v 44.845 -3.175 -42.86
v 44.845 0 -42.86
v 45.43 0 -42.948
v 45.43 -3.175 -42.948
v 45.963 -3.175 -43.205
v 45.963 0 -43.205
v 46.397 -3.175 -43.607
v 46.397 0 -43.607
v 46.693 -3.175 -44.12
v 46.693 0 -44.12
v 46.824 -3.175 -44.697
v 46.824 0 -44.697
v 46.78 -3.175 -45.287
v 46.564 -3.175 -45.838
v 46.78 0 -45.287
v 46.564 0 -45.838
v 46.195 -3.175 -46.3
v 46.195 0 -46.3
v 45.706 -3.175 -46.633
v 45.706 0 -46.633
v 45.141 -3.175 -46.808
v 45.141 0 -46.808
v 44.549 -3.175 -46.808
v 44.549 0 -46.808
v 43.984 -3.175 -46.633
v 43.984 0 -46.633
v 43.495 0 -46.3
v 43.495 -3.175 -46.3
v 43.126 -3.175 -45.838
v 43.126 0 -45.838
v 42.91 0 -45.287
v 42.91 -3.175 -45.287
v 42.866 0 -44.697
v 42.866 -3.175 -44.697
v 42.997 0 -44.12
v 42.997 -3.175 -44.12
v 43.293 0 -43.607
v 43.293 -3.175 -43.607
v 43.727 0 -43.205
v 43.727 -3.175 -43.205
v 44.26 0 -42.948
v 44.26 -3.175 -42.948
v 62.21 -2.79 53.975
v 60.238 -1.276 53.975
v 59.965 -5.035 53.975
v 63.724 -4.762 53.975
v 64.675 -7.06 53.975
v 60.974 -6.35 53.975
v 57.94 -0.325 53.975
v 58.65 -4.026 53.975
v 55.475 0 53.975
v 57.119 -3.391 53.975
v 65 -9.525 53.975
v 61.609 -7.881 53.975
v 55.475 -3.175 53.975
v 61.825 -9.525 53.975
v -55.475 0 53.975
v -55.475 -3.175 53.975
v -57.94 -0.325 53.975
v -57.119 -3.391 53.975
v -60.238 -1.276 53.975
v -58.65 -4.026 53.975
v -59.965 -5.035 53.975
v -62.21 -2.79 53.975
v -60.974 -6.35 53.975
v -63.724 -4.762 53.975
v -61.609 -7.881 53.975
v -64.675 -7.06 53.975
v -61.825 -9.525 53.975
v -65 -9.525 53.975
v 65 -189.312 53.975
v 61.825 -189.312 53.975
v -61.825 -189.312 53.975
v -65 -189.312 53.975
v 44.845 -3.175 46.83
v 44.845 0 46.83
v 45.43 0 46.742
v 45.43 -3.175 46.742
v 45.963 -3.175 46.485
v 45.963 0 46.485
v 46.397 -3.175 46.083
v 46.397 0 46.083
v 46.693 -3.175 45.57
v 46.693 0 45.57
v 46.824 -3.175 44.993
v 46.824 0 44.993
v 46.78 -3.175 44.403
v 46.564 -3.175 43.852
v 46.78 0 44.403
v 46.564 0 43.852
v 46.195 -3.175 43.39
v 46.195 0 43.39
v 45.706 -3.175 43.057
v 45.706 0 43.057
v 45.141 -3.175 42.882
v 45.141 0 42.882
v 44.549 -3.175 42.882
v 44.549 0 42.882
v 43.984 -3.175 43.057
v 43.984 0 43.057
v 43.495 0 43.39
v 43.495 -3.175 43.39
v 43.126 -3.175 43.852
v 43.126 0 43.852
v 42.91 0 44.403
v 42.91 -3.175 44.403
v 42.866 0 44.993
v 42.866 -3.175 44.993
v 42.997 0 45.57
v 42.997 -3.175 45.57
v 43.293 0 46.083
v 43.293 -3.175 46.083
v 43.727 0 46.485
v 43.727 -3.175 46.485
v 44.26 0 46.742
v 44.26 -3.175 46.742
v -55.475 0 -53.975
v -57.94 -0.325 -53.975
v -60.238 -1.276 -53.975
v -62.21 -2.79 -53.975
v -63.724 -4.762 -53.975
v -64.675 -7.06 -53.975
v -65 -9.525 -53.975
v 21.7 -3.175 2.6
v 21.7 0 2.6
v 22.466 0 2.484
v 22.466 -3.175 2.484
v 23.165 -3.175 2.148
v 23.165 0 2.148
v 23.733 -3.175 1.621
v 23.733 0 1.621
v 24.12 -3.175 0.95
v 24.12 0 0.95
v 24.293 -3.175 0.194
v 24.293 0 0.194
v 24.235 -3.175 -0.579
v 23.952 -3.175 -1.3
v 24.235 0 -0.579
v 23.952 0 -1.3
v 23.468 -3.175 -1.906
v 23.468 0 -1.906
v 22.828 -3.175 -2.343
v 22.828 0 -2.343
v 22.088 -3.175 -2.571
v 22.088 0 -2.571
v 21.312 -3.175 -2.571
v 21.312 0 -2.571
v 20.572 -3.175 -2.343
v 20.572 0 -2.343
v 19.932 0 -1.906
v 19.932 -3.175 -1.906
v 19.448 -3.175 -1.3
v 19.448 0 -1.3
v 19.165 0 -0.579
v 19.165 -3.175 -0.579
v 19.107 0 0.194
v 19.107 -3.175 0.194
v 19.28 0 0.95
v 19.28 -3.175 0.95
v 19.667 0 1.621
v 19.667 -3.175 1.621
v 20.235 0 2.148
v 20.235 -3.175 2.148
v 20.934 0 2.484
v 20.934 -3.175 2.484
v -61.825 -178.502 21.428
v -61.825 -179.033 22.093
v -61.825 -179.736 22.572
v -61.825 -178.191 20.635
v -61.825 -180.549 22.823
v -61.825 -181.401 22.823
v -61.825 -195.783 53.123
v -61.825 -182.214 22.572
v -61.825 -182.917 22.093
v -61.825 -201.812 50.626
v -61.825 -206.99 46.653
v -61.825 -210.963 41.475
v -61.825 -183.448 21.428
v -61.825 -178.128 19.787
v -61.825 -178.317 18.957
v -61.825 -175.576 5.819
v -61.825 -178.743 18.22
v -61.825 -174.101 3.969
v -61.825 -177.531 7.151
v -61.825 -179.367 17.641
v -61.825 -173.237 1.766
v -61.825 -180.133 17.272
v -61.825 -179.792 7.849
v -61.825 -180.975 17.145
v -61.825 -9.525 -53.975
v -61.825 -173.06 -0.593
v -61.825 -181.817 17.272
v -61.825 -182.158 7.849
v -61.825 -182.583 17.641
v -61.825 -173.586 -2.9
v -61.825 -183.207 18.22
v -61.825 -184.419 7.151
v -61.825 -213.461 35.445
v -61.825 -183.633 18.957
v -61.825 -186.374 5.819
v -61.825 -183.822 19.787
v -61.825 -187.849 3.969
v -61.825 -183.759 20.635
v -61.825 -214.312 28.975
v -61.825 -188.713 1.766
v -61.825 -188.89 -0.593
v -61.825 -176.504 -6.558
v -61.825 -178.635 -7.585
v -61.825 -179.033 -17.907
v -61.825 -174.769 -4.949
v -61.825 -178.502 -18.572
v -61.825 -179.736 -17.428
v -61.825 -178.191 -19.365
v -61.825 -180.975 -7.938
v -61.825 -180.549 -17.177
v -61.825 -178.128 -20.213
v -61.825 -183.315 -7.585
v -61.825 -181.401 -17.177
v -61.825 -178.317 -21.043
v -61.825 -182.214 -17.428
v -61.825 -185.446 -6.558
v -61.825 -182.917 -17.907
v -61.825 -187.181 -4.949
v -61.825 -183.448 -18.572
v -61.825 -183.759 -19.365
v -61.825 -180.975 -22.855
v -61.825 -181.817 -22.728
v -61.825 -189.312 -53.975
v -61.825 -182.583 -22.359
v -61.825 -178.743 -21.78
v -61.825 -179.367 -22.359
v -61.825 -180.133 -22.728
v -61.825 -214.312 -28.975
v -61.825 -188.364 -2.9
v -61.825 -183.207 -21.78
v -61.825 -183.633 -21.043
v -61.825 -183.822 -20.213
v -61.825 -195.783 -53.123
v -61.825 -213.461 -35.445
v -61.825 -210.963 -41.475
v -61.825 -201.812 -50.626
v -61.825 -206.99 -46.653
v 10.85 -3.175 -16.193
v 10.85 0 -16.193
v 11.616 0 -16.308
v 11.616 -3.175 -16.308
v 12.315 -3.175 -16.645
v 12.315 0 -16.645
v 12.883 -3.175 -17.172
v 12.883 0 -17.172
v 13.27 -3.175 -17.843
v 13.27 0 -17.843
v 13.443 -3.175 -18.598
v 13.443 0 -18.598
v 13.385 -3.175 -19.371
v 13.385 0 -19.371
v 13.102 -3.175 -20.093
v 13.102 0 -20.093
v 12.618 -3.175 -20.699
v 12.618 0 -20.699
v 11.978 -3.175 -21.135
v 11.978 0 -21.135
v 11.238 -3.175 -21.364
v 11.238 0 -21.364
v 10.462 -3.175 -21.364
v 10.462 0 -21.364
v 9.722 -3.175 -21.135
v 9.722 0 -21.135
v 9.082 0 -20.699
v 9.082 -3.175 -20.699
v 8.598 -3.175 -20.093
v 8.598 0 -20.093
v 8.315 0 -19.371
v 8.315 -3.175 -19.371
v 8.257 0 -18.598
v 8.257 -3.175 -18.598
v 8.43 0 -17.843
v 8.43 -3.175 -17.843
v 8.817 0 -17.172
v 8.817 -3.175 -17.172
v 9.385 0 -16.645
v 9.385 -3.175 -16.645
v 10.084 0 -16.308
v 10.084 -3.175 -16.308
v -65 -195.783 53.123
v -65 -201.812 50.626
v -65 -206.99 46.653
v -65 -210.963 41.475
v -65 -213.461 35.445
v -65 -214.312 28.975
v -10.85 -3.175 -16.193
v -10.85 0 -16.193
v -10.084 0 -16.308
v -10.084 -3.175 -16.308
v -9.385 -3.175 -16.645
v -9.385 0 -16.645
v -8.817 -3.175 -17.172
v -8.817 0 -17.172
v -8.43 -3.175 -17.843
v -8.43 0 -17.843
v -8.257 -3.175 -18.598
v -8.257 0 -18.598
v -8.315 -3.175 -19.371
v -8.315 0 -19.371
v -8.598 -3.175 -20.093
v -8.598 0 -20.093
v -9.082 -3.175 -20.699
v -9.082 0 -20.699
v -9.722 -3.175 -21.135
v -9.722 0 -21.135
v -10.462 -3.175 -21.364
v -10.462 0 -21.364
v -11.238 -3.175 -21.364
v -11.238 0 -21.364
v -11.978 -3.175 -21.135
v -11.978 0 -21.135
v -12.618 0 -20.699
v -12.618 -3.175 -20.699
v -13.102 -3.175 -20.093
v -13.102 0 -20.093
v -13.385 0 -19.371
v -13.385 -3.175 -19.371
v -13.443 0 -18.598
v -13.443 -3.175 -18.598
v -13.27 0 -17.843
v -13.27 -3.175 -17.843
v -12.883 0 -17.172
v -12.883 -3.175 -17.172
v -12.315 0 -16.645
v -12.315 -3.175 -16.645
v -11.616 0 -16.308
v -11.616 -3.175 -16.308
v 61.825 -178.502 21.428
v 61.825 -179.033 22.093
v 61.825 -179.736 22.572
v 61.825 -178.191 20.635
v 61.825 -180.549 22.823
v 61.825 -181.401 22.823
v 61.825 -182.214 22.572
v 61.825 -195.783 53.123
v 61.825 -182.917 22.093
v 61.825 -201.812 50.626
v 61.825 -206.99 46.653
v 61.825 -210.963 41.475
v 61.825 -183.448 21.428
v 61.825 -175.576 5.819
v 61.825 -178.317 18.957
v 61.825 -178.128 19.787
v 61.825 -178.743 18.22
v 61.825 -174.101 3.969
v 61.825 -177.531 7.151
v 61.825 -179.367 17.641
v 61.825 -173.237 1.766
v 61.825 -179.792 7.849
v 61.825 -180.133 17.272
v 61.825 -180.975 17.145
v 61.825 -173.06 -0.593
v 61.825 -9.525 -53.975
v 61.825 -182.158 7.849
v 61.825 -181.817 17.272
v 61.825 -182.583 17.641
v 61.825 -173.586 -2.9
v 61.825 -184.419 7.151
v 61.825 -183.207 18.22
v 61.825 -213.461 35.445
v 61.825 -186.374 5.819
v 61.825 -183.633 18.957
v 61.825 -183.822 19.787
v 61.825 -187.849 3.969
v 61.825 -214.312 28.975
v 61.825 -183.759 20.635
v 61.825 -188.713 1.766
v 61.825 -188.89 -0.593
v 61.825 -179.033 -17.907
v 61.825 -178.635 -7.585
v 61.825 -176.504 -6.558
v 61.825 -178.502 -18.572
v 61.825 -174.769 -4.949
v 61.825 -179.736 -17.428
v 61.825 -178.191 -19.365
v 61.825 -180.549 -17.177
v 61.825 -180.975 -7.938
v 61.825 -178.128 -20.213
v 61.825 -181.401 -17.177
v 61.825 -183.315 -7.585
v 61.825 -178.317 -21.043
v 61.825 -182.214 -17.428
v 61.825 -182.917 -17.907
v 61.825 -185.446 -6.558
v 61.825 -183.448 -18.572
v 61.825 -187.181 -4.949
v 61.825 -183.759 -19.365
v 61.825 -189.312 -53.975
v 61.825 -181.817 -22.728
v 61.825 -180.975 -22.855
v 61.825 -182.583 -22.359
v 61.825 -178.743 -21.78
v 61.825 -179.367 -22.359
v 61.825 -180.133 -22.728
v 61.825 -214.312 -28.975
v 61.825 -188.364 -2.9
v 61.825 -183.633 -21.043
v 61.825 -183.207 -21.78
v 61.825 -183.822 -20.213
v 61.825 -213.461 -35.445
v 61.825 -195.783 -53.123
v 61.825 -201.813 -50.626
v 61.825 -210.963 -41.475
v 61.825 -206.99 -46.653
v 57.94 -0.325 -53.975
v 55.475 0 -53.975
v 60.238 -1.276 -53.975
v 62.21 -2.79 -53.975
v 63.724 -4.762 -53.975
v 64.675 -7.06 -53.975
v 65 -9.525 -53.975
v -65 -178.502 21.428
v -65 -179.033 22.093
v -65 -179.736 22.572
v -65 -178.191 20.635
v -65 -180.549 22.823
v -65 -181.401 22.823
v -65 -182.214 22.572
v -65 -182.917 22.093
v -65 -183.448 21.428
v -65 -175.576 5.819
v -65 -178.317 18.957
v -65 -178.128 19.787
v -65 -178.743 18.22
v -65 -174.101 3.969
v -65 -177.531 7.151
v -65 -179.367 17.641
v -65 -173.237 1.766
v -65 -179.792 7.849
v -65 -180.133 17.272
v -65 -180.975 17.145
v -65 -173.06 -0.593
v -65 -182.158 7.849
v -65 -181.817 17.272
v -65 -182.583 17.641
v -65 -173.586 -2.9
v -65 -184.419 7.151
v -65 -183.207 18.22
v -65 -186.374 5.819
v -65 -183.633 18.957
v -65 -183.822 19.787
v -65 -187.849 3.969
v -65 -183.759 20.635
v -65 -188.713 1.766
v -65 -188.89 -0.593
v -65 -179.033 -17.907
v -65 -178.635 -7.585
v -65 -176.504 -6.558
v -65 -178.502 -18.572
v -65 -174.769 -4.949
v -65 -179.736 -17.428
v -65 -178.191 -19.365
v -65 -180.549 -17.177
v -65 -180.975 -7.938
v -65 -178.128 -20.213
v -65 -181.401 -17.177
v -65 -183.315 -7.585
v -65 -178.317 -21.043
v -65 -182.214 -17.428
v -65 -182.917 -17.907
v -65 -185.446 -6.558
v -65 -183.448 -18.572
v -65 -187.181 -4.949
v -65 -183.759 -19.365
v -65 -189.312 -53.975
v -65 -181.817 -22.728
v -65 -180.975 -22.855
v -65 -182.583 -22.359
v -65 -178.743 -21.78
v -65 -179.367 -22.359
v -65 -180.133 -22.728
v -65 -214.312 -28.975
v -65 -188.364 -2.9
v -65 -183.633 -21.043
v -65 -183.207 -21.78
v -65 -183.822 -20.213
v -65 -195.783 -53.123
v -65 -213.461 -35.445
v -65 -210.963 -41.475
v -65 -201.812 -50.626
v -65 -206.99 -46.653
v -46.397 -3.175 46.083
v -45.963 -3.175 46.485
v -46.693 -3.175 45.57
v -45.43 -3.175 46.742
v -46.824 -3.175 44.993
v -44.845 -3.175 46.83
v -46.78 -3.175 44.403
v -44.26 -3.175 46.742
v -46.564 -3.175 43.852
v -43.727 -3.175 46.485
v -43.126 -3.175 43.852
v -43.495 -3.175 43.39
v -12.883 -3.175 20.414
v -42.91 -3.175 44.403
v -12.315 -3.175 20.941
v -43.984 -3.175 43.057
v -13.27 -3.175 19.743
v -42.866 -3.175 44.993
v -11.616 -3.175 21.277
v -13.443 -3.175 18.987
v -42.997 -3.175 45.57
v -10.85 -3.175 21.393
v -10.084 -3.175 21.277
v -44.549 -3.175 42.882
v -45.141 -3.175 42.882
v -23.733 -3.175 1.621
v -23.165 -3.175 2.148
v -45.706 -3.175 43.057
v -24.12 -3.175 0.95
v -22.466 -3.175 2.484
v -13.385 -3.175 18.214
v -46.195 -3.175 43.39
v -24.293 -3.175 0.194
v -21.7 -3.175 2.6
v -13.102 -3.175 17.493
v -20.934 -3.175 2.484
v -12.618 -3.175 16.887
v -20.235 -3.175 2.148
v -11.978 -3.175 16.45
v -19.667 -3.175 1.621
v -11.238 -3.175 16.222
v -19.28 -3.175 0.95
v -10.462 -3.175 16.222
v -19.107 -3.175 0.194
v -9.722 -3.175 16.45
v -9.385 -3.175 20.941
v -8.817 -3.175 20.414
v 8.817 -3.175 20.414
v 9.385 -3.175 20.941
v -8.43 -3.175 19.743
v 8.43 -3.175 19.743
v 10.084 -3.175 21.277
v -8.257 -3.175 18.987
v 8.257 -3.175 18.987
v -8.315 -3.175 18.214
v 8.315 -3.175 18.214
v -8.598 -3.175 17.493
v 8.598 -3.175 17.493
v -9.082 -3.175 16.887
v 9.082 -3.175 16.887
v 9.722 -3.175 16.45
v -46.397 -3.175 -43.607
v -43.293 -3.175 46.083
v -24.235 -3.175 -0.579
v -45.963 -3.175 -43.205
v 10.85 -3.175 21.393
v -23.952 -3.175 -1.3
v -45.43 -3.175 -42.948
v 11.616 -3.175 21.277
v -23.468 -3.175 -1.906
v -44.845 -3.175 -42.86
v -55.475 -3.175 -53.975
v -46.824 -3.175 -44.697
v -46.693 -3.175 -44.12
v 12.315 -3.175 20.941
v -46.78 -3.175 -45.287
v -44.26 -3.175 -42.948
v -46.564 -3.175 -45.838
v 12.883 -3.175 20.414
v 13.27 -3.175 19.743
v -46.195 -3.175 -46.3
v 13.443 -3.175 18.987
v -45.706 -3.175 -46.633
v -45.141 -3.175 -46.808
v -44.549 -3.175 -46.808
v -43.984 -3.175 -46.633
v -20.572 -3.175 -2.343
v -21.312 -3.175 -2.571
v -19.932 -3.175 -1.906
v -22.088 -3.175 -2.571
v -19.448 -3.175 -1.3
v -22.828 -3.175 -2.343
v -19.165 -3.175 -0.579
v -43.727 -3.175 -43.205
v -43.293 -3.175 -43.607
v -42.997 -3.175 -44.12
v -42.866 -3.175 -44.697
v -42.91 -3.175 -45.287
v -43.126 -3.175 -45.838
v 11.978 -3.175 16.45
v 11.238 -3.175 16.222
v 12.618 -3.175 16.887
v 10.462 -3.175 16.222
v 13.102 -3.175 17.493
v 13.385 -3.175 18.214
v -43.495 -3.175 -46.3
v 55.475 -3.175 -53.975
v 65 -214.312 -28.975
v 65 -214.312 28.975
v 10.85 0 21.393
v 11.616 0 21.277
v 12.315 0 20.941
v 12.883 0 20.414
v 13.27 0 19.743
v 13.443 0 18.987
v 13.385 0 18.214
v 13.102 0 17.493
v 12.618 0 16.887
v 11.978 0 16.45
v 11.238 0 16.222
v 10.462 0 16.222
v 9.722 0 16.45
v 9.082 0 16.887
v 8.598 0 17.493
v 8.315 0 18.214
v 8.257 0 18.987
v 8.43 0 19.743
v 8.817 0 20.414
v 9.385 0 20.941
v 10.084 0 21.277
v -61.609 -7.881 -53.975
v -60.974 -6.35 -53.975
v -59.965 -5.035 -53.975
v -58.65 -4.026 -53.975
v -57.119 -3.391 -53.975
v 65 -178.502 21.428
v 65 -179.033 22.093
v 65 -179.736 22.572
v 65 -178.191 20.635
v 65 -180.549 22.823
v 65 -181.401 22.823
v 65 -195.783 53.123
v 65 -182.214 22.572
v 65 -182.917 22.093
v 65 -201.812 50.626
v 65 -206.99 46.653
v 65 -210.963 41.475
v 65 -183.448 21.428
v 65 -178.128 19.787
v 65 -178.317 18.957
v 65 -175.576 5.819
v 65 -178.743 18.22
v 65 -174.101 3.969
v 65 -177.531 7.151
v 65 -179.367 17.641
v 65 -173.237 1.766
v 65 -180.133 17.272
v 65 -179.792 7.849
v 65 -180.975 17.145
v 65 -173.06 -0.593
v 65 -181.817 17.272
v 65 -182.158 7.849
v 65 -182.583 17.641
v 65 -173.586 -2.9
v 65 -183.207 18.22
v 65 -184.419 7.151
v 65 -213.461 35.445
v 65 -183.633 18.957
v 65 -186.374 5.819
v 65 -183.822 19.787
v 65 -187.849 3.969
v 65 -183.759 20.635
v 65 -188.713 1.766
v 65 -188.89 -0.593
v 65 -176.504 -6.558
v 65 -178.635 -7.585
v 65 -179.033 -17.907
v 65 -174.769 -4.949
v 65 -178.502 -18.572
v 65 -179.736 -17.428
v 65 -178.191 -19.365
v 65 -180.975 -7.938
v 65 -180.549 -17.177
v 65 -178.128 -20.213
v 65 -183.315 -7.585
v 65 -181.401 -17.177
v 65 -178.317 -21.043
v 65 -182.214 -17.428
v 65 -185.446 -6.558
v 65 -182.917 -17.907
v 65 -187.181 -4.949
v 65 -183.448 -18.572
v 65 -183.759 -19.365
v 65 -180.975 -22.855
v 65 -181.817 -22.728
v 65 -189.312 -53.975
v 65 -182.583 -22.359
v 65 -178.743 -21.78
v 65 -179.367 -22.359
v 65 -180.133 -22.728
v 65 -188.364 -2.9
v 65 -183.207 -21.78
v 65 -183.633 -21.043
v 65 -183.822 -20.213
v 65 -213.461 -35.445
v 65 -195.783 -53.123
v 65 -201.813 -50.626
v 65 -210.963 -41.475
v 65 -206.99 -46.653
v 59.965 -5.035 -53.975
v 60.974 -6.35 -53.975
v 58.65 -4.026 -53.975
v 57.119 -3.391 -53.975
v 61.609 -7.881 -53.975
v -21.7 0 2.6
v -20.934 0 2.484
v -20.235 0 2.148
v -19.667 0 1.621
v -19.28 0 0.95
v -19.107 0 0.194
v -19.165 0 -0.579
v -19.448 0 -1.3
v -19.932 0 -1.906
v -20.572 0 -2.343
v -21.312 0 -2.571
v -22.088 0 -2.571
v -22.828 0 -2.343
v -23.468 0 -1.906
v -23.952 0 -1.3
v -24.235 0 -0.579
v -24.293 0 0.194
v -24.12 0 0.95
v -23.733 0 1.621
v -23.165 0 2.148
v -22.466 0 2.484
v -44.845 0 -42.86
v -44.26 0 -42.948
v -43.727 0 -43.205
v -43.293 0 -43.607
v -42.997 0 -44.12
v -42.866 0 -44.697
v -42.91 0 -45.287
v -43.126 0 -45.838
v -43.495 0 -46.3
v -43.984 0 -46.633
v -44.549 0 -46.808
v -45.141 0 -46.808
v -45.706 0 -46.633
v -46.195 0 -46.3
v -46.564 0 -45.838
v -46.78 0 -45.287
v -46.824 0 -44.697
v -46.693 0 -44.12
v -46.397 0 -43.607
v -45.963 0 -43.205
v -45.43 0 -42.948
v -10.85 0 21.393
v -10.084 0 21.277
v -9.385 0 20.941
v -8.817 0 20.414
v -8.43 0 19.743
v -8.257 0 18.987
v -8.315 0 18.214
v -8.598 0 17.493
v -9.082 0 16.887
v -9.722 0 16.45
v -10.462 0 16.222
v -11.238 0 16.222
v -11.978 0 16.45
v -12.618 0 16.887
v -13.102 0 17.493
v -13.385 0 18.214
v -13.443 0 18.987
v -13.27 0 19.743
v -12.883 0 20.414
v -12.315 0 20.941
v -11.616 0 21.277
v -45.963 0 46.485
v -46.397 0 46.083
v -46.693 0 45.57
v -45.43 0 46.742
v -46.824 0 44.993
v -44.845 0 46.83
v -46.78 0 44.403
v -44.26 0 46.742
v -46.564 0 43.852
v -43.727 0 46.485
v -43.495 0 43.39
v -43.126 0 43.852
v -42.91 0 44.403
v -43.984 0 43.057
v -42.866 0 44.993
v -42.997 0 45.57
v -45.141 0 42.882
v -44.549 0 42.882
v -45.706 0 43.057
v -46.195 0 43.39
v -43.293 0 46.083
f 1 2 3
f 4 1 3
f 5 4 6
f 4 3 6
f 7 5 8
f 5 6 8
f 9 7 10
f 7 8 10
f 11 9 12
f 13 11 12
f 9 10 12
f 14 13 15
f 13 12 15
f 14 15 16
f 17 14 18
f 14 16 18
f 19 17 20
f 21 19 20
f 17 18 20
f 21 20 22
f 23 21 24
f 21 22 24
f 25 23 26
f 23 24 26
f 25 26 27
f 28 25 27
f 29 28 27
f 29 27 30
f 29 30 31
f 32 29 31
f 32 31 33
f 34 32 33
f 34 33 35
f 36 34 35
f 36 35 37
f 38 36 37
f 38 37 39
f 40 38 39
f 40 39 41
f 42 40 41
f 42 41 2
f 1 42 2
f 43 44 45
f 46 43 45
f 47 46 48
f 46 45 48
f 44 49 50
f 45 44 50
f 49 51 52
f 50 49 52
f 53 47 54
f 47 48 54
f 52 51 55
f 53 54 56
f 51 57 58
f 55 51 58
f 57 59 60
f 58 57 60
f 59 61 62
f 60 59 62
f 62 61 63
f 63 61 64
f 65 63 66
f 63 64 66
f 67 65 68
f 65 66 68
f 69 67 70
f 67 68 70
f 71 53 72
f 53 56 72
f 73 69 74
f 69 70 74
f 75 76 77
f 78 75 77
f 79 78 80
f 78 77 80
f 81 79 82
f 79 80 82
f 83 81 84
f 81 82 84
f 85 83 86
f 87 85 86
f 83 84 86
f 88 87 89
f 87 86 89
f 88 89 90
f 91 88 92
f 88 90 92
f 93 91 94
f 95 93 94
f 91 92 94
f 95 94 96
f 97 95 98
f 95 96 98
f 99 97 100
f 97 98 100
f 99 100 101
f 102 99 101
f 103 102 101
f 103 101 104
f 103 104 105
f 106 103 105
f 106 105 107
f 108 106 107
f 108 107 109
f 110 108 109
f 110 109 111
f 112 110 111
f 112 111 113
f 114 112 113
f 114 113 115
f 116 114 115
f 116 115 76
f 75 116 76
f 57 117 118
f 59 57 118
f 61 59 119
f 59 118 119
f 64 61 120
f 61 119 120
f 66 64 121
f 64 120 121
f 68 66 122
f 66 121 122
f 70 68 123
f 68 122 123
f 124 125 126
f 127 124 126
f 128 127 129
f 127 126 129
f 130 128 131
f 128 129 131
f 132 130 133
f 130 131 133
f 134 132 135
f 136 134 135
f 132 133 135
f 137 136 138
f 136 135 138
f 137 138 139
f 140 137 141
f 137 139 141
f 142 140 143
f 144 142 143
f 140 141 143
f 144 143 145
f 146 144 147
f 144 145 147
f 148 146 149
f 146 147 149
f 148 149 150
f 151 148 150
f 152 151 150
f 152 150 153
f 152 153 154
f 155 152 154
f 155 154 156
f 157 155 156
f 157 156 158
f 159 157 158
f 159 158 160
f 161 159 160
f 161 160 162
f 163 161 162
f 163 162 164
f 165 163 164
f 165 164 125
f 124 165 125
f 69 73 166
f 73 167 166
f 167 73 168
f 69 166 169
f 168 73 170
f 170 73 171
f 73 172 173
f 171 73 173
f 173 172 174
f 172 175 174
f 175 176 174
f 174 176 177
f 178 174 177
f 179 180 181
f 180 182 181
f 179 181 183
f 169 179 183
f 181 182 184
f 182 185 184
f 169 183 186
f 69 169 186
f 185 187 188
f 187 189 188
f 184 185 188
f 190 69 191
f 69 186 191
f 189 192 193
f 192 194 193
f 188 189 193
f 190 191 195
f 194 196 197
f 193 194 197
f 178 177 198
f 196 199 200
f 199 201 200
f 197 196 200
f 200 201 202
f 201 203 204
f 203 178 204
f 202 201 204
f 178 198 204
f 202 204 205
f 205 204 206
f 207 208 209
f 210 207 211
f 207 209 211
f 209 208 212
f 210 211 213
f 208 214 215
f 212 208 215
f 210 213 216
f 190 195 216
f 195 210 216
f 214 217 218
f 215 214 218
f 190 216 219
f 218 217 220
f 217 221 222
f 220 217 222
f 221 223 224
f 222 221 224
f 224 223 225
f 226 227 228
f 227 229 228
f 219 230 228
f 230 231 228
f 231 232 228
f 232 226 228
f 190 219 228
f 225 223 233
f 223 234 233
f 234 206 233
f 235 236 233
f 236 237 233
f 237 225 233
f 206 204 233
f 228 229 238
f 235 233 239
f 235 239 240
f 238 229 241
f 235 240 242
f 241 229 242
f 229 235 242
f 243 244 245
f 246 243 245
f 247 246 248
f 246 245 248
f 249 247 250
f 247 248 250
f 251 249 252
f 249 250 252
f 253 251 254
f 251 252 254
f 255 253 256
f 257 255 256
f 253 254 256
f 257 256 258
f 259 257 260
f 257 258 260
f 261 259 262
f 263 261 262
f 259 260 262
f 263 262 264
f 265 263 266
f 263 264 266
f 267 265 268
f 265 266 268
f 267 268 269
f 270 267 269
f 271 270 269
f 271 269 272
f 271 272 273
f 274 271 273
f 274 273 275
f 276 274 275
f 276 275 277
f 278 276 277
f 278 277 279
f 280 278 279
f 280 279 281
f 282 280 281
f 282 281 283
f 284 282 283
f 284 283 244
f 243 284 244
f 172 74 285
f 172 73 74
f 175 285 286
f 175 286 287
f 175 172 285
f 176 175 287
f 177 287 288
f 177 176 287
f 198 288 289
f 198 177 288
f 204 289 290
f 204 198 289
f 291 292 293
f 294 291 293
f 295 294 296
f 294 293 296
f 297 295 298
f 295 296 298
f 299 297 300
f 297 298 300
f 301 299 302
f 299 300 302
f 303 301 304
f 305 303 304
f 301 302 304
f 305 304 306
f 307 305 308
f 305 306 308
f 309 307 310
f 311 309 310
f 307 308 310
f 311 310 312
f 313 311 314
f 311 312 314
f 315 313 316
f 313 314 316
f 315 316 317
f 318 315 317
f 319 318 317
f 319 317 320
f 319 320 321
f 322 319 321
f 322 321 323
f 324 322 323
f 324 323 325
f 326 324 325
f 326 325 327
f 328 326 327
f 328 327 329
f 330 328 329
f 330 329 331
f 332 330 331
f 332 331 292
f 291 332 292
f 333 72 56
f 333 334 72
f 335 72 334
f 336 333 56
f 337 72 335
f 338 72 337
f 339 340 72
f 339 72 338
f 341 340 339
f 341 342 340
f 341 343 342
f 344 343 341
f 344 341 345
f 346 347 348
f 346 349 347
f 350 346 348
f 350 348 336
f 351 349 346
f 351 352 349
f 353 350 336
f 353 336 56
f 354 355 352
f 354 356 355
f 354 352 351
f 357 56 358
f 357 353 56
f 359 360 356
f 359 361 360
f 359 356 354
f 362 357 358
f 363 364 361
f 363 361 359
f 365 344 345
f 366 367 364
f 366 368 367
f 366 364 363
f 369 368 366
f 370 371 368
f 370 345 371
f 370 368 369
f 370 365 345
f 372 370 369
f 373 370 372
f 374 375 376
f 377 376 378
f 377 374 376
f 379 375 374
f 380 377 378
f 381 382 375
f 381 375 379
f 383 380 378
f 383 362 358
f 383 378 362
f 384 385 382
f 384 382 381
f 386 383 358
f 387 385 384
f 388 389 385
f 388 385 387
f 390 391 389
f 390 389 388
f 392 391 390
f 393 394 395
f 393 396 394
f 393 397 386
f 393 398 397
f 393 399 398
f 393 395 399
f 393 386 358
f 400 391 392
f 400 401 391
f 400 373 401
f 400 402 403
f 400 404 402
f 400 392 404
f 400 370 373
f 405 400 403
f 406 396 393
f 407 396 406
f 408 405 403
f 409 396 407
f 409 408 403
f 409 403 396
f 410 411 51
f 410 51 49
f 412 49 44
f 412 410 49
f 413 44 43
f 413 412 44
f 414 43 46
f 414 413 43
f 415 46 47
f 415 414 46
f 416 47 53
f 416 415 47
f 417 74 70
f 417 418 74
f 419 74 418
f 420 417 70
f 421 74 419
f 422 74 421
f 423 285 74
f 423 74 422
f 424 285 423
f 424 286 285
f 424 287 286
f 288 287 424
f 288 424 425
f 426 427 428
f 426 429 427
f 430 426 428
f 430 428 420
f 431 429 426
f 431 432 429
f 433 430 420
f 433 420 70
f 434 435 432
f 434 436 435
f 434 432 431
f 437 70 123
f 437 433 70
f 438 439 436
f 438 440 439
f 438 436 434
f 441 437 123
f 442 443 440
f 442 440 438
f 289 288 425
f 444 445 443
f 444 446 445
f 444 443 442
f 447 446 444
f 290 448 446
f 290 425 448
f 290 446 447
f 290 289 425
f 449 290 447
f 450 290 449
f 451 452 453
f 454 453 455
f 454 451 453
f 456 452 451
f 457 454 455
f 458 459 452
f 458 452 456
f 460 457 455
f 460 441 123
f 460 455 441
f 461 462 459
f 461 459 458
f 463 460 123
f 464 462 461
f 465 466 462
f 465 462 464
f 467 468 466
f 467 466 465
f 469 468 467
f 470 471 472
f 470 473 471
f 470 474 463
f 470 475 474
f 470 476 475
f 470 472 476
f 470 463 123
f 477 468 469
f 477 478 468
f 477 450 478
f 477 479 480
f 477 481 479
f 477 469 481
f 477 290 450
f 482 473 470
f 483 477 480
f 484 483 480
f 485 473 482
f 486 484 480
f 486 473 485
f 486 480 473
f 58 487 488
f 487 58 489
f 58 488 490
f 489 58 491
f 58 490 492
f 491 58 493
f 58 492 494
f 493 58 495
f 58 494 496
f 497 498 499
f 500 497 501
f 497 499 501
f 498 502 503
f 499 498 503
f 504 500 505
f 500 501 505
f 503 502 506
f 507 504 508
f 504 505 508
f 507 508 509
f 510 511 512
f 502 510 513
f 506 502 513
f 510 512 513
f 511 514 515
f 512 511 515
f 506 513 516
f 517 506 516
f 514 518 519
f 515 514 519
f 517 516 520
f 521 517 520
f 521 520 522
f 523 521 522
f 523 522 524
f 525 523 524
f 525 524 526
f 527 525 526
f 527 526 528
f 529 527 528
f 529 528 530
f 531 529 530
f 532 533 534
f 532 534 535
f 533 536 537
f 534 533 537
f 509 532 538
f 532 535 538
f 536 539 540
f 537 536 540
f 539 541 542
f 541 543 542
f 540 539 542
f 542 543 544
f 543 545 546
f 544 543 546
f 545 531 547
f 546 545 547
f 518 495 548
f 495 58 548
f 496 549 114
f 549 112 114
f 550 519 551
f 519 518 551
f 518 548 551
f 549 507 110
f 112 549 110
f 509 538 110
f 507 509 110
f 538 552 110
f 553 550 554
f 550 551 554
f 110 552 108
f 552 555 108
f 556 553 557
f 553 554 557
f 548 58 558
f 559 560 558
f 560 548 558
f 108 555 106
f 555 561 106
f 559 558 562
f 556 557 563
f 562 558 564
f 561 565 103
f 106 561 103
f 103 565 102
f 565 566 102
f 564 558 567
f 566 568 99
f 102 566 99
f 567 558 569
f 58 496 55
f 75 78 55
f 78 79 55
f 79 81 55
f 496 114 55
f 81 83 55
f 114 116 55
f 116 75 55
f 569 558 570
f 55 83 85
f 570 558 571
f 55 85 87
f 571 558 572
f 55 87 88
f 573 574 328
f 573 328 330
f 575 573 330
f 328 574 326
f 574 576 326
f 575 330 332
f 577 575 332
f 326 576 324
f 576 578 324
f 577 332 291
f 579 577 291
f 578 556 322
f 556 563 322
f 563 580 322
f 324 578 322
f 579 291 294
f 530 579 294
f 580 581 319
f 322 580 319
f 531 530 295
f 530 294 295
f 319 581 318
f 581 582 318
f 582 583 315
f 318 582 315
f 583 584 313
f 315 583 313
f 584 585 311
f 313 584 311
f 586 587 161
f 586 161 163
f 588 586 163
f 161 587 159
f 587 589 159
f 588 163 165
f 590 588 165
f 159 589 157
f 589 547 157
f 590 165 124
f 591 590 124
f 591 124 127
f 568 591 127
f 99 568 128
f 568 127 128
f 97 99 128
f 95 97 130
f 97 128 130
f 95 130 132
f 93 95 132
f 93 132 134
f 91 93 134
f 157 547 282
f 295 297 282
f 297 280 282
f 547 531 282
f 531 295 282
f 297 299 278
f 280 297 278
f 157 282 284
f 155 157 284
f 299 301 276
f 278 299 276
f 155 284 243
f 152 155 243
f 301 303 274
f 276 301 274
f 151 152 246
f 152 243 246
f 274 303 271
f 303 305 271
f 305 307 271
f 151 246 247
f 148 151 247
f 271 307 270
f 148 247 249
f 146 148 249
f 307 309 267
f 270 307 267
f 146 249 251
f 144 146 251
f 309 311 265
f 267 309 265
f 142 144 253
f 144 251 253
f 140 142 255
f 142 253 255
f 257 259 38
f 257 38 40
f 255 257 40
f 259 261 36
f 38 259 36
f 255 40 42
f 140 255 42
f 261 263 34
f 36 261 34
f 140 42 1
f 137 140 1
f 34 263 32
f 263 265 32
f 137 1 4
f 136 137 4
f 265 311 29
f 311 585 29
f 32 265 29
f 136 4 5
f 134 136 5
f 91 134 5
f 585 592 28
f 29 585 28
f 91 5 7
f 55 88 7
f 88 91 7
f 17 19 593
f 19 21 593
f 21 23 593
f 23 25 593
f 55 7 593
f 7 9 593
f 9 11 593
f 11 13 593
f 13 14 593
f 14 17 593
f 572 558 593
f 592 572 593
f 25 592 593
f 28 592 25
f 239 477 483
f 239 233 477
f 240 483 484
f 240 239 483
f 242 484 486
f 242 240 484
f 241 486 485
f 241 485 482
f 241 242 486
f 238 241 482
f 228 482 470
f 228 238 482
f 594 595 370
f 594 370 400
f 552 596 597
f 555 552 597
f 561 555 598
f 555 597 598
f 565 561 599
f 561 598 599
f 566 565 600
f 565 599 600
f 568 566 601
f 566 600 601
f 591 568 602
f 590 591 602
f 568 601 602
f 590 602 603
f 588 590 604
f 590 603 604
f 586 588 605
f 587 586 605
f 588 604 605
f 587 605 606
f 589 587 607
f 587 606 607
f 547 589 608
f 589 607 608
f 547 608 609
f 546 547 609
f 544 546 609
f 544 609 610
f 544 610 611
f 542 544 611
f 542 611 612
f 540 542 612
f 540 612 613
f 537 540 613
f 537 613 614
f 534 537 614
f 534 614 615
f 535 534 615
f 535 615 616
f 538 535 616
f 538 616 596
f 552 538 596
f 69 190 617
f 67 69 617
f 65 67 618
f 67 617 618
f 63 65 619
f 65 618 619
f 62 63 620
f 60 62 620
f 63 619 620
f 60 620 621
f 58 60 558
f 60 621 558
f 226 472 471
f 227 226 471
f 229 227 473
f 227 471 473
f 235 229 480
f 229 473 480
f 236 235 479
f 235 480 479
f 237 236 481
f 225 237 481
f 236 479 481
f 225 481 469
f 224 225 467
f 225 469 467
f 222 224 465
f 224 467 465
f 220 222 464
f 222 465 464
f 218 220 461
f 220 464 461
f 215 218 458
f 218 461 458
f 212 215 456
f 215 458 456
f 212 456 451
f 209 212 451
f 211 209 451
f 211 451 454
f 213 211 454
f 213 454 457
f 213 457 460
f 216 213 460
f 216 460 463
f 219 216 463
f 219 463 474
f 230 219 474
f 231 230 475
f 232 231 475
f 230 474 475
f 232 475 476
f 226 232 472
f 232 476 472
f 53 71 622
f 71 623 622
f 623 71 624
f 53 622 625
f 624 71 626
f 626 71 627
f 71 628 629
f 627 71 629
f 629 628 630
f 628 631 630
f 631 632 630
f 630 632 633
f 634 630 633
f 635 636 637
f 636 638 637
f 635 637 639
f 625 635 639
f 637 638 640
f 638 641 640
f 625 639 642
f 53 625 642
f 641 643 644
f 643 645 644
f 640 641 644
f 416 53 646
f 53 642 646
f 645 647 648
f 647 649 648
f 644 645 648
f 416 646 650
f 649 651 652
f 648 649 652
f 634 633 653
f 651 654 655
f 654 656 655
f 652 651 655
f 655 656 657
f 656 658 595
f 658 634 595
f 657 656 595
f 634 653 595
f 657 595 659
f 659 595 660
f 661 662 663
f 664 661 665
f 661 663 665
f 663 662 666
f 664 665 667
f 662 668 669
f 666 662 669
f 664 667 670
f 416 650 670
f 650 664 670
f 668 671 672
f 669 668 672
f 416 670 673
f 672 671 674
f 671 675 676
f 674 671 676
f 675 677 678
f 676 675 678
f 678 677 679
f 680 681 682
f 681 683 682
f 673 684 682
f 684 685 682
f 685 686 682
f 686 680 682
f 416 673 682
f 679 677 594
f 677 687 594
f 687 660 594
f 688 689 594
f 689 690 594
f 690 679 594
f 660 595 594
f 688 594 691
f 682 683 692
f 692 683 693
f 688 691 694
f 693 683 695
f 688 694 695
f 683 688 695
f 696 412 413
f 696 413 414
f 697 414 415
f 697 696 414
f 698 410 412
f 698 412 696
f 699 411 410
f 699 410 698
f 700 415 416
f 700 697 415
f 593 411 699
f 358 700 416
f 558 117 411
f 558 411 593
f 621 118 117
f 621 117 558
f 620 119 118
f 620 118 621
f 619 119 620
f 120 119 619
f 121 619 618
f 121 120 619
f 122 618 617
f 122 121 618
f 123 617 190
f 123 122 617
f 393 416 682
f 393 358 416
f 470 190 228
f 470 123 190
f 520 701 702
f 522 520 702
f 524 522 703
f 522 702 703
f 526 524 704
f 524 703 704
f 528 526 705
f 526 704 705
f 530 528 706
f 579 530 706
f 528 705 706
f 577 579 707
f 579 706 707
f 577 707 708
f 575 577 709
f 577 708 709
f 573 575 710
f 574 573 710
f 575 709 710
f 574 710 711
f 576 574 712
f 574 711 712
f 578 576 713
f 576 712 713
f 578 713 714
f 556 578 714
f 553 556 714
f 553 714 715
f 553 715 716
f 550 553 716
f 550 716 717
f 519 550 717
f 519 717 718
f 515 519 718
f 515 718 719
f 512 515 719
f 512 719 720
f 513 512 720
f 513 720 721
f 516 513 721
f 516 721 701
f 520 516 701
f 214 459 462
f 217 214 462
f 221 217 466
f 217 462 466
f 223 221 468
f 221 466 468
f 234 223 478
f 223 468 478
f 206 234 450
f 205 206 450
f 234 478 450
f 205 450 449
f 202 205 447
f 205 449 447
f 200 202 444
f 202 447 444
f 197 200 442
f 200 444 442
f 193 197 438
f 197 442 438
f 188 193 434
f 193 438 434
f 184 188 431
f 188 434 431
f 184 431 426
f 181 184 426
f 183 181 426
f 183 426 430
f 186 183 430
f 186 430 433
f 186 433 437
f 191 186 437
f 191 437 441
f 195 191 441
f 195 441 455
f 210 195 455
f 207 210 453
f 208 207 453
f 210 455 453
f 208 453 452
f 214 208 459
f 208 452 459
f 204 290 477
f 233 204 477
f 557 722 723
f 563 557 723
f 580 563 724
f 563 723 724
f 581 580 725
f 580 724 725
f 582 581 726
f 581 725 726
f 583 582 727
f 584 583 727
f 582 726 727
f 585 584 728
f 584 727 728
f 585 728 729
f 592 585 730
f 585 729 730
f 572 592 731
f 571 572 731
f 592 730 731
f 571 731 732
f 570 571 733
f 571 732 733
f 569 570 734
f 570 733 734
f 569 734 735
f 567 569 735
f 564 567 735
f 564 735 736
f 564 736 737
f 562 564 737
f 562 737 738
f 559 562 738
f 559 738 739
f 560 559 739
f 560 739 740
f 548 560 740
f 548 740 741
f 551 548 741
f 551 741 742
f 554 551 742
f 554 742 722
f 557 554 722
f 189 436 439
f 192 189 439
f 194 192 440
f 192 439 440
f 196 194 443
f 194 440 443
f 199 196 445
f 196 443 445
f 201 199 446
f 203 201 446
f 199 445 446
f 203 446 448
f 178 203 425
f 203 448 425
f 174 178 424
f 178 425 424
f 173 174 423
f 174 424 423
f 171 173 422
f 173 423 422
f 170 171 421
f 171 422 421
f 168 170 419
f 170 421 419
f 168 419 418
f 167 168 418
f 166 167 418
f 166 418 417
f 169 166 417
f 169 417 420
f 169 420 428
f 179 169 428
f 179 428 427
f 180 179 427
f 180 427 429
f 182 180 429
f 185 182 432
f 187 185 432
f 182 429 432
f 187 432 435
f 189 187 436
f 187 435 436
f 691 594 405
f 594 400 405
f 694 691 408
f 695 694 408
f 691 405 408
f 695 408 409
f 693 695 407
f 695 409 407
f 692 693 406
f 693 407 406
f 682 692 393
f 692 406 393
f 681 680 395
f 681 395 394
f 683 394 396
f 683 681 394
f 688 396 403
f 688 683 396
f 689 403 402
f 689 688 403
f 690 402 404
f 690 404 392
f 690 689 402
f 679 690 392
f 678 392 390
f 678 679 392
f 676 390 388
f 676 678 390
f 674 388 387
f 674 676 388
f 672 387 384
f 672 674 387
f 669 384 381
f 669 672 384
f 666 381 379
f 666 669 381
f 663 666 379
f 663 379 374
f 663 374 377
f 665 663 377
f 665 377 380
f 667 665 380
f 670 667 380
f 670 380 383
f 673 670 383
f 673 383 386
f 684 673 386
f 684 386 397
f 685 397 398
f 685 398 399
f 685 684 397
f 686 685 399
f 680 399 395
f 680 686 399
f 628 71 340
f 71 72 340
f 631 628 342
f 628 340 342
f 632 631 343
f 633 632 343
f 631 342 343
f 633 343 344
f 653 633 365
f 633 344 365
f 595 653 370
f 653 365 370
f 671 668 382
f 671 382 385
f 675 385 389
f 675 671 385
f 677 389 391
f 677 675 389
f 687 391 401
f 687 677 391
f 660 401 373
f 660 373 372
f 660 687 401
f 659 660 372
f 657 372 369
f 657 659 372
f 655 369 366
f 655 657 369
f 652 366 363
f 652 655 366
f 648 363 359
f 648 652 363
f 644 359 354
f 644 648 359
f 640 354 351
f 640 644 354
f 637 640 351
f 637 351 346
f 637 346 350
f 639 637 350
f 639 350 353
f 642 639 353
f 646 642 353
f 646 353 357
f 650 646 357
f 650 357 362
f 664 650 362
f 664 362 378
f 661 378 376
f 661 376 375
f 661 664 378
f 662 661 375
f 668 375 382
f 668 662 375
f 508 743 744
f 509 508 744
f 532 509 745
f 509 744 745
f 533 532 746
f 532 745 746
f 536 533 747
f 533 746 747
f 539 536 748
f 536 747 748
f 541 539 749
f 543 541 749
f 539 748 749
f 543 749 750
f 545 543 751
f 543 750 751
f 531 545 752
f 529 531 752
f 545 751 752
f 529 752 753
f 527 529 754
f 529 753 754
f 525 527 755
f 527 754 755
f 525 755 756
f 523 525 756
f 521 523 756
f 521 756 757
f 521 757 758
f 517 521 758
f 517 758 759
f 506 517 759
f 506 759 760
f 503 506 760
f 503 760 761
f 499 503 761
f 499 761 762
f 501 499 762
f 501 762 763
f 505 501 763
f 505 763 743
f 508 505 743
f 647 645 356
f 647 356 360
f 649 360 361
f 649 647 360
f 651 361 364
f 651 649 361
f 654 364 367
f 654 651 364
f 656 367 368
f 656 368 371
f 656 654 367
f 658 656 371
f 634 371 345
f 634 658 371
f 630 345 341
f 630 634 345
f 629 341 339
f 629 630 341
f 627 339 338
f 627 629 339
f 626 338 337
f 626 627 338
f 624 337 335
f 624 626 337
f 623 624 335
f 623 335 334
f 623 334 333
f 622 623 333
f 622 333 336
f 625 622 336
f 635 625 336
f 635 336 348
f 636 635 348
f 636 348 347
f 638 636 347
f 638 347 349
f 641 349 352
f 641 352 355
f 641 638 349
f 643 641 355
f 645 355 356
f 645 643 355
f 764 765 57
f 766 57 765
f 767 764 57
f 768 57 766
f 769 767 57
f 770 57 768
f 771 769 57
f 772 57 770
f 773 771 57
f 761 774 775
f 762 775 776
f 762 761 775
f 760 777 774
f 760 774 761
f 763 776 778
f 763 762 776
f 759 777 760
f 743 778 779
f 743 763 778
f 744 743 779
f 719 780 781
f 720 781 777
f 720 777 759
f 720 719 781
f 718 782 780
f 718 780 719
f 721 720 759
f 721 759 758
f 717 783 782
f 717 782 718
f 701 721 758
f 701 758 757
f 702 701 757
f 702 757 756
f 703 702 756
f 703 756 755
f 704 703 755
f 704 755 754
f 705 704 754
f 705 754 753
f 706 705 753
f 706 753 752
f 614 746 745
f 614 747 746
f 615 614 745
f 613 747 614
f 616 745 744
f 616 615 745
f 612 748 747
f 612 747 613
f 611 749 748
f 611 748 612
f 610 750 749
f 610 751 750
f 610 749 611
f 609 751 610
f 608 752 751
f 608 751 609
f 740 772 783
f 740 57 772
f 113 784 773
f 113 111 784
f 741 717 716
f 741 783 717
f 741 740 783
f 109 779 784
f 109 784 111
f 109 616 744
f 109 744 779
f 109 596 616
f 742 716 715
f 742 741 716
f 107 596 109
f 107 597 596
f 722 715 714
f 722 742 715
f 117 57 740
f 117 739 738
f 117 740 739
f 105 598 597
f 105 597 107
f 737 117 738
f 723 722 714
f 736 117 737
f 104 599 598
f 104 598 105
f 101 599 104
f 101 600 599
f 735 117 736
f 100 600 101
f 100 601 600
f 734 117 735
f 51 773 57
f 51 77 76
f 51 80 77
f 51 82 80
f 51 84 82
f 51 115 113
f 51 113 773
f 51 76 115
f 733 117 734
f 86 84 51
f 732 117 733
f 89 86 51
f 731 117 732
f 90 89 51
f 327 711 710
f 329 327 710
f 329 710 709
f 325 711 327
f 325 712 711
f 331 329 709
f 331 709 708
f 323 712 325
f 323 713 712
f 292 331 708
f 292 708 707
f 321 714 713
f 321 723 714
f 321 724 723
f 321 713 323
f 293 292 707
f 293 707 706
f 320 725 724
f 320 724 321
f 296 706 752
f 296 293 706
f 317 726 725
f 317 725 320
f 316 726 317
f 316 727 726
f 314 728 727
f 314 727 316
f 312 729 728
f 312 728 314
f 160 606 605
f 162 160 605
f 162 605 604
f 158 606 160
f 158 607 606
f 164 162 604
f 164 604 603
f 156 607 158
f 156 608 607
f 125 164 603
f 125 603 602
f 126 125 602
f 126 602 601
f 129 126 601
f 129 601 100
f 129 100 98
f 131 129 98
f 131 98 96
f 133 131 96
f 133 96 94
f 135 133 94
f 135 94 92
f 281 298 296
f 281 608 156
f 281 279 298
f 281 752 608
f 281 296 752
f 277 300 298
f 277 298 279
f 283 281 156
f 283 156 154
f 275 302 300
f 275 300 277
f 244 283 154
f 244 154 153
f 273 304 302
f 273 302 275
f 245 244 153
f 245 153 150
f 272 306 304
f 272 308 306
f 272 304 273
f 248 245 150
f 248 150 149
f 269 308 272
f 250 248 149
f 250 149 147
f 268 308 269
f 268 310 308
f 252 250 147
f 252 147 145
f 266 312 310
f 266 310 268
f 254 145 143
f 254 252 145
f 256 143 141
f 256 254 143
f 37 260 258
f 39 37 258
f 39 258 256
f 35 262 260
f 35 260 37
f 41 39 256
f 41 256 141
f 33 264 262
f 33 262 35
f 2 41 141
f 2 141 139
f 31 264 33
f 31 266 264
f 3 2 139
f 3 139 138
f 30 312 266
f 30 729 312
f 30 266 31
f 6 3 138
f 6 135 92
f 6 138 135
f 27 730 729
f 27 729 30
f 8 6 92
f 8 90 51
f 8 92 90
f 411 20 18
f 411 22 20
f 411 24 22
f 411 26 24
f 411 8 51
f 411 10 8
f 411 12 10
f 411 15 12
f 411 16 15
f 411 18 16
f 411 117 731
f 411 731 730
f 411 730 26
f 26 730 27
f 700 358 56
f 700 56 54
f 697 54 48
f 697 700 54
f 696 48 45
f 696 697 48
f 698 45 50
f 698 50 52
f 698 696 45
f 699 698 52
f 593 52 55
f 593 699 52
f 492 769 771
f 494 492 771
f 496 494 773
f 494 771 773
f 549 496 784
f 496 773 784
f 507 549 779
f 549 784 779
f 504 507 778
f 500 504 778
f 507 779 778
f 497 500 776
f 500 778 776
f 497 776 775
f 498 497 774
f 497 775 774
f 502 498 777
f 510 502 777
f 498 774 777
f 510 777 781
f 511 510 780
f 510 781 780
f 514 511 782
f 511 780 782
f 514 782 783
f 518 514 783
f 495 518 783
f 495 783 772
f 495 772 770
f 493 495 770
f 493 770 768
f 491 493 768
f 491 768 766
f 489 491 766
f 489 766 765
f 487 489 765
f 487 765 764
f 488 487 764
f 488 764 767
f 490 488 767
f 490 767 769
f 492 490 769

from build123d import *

# Parameters (mm, degrees)
SKETCH3_W                    = 130
SKETCH3_H                    = 107.95
BASE_FLANGE1_DEPTH           = 3.175
EDGE_FLANGE1_STRIP_W         = 25.4
EDGE_FLANGE1_STRIP_H         = 3.175
EDGE_FLANGE1_STRIP_CUT_DEPTH = 107.95
EDGE_FLANGE1_DEPTH           = 107.95
EDGE_FLANGE1_PROFILE_W       = 107.95
EDGE_FLANGE1_PROFILE_H       = 204.7875
EDGE_FLANGE1_PROFILE_R       = 2.855235605
EDGE_FLANGE1_PROFILE_R_2     = 7.9375
EDGE_FLANGE1_FLAT_DEPTH      = 3.175
FILLET1_R                    = 25
SKETCH13_R                   = 2.6
FLANGE_COUPLING_HOLES_DEPTH  = 231.365249726
SKETCH15_R                   = 1.985
CUT_EXTRUDE1_DEPTH           = 231.365249726


# Sheet-metal steps are written as plain solids
with BuildPart() as part:
    # Sketch3 → Base-Flange1 (new body)
    with BuildSketch(Plane(origin=(0, 0, 0), x_dir=(1, 0, 0), z_dir=(0, 1, 0))):
        Rectangle(SKETCH3_W, SKETCH3_H)
    extrude(amount=-BASE_FLANGE1_DEPTH)

    # Edge-Flange1 strip (across the edge) → Edge-Flange1 strip cut (cut)
    with BuildSketch(Plane(origin=(65, -3.175, -53.975), x_dir=(-1, 0, 0), z_dir=(0, 0, 1))):
        with Locations((-3.175, -1.5875)):
            Rectangle(EDGE_FLANGE1_STRIP_W, EDGE_FLANGE1_STRIP_H)
    edge_flange1_strip_cut = extrude(amount=EDGE_FLANGE1_STRIP_CUT_DEPTH, mode=Mode.SUBTRACT)

    # Edge-Flange1 bend section (across the edge) → Edge-Flange1 (add)
    with BuildSketch(Plane(origin=(65, -3.175, -53.975), x_dir=(-1, 0, 0), z_dir=(0, 0, 1))):
        with BuildLine():
            Line((0, 6.35), (3.175, 6.35))
            ThreePointArc((3.175, 6.35), (5.034871939, 1.859871939), (9.525, 0))
            Line((9.525, 0), (9.525, -3.175))
            ThreePointArc((9.525, -3.175), (2.789807909, -0.385192091), (0, 6.35))
        make_face()
    edge_flange1 = extrude(amount=EDGE_FLANGE1_DEPTH)

    # Edge-Flange1 profile (on flange) → Edge-Flange1 flat (add)
    with BuildSketch(Plane(origin=(65, -3.175, 0), x_dir=(0, 0, -1), z_dir=(-1, 0, 0))):
        with Locations((0, 108.74375)):
            Rectangle(EDGE_FLANGE1_PROFILE_W, EDGE_FLANGE1_PROFILE_H)
        with Locations((20, 177.8)):
            Circle(EDGE_FLANGE1_PROFILE_R, mode=Mode.SUBTRACT)
        with Locations((0, 177.8)):
            Circle(EDGE_FLANGE1_PROFILE_R_2, mode=Mode.SUBTRACT)
        with Locations((-20, 177.8)):
            Circle(EDGE_FLANGE1_PROFILE_R, mode=Mode.SUBTRACT)
    edge_flange1_flat = extrude(amount=EDGE_FLANGE1_FLAT_DEPTH)

    # Mirror1: Edge-Flange1 strip cut, Edge-Flange1, Edge-Flange1 flat across plane
    add(edge_flange1_strip_cut.mirror(Plane(origin=(0, 0, 0), x_dir=(0, 0, 1), z_dir=(1, 0, 0))), mode=Mode.SUBTRACT)
    add(edge_flange1.mirror(Plane(origin=(0, 0, 0), x_dir=(0, 0, 1), z_dir=(1, 0, 0))))
    add(edge_flange1_flat.mirror(Plane(origin=(0, 0, 0), x_dir=(0, 0, 1), z_dir=(1, 0, 0))))

    # Fillet1
    fillet1_edges = [part.edges().sort_by_distance(p)[0] for p in [
        (-63.4125, -214.3125, -53.975),
        (63.4125, -214.3125, -53.975),
        (63.4125, -214.3125, 53.975),
        (-63.4125, -214.3125, 53.975),
    ]]
    fillet(fillet1_edges, radius=FILLET1_R)

    # Sketch13 → Flange Coupling Holes (cut, through all)
    with BuildSketch(Plane(origin=(0, 0, 0), x_dir=(1, 0, 0), z_dir=(0, 1, 0))):
        with Locations(Location((-21.7, 0, 0), (0, 0, 270))):
            Circle(SKETCH13_R)
        with Locations(Location((-10.85, 18.792751262, 0), (0, 0, 270))):
            Circle(SKETCH13_R)
        with Locations(Location((10.85, 18.792751262, 0), (0, 0, 270))):
            Circle(SKETCH13_R)
        with Locations(Location((21.7, 0, 0), (0, 0, 270))):
            Circle(SKETCH13_R)
        with Locations(Location((10.85, -18.792751262, 0), (0, 0, 270))):
            Circle(SKETCH13_R)
        with Locations(Location((-10.85, -18.792751262, 0), (0, 0, 270))):
            Circle(SKETCH13_R)
    extrude(amount=-FLANGE_COUPLING_HOLES_DEPTH, mode=Mode.SUBTRACT)

    # Sketch15 → Cut-Extrude1 (cut, through all)
    with BuildSketch(Plane(origin=(0, 0, 0), x_dir=(1, 0, 0), z_dir=(0, 1, 0))):
        with Locations(Location((-44.845, 44.845, 0), (0, 0, 270))):
            Circle(SKETCH15_R)
        with Locations(Location((44.845, 44.845, 0), (0, 0, 270))):
            Circle(SKETCH15_R)
        with Locations(Location((44.845, -44.845, 0), (0, 0, 270))):
            Circle(SKETCH15_R)
        with Locations(Location((-44.845, -44.845, 0), (0, 0, 270))):
            Circle(SKETCH15_R)
    extrude(amount=-CUT_EXTRUDE1_DEPTH, mode=Mode.SUBTRACT)


solid = part.part
